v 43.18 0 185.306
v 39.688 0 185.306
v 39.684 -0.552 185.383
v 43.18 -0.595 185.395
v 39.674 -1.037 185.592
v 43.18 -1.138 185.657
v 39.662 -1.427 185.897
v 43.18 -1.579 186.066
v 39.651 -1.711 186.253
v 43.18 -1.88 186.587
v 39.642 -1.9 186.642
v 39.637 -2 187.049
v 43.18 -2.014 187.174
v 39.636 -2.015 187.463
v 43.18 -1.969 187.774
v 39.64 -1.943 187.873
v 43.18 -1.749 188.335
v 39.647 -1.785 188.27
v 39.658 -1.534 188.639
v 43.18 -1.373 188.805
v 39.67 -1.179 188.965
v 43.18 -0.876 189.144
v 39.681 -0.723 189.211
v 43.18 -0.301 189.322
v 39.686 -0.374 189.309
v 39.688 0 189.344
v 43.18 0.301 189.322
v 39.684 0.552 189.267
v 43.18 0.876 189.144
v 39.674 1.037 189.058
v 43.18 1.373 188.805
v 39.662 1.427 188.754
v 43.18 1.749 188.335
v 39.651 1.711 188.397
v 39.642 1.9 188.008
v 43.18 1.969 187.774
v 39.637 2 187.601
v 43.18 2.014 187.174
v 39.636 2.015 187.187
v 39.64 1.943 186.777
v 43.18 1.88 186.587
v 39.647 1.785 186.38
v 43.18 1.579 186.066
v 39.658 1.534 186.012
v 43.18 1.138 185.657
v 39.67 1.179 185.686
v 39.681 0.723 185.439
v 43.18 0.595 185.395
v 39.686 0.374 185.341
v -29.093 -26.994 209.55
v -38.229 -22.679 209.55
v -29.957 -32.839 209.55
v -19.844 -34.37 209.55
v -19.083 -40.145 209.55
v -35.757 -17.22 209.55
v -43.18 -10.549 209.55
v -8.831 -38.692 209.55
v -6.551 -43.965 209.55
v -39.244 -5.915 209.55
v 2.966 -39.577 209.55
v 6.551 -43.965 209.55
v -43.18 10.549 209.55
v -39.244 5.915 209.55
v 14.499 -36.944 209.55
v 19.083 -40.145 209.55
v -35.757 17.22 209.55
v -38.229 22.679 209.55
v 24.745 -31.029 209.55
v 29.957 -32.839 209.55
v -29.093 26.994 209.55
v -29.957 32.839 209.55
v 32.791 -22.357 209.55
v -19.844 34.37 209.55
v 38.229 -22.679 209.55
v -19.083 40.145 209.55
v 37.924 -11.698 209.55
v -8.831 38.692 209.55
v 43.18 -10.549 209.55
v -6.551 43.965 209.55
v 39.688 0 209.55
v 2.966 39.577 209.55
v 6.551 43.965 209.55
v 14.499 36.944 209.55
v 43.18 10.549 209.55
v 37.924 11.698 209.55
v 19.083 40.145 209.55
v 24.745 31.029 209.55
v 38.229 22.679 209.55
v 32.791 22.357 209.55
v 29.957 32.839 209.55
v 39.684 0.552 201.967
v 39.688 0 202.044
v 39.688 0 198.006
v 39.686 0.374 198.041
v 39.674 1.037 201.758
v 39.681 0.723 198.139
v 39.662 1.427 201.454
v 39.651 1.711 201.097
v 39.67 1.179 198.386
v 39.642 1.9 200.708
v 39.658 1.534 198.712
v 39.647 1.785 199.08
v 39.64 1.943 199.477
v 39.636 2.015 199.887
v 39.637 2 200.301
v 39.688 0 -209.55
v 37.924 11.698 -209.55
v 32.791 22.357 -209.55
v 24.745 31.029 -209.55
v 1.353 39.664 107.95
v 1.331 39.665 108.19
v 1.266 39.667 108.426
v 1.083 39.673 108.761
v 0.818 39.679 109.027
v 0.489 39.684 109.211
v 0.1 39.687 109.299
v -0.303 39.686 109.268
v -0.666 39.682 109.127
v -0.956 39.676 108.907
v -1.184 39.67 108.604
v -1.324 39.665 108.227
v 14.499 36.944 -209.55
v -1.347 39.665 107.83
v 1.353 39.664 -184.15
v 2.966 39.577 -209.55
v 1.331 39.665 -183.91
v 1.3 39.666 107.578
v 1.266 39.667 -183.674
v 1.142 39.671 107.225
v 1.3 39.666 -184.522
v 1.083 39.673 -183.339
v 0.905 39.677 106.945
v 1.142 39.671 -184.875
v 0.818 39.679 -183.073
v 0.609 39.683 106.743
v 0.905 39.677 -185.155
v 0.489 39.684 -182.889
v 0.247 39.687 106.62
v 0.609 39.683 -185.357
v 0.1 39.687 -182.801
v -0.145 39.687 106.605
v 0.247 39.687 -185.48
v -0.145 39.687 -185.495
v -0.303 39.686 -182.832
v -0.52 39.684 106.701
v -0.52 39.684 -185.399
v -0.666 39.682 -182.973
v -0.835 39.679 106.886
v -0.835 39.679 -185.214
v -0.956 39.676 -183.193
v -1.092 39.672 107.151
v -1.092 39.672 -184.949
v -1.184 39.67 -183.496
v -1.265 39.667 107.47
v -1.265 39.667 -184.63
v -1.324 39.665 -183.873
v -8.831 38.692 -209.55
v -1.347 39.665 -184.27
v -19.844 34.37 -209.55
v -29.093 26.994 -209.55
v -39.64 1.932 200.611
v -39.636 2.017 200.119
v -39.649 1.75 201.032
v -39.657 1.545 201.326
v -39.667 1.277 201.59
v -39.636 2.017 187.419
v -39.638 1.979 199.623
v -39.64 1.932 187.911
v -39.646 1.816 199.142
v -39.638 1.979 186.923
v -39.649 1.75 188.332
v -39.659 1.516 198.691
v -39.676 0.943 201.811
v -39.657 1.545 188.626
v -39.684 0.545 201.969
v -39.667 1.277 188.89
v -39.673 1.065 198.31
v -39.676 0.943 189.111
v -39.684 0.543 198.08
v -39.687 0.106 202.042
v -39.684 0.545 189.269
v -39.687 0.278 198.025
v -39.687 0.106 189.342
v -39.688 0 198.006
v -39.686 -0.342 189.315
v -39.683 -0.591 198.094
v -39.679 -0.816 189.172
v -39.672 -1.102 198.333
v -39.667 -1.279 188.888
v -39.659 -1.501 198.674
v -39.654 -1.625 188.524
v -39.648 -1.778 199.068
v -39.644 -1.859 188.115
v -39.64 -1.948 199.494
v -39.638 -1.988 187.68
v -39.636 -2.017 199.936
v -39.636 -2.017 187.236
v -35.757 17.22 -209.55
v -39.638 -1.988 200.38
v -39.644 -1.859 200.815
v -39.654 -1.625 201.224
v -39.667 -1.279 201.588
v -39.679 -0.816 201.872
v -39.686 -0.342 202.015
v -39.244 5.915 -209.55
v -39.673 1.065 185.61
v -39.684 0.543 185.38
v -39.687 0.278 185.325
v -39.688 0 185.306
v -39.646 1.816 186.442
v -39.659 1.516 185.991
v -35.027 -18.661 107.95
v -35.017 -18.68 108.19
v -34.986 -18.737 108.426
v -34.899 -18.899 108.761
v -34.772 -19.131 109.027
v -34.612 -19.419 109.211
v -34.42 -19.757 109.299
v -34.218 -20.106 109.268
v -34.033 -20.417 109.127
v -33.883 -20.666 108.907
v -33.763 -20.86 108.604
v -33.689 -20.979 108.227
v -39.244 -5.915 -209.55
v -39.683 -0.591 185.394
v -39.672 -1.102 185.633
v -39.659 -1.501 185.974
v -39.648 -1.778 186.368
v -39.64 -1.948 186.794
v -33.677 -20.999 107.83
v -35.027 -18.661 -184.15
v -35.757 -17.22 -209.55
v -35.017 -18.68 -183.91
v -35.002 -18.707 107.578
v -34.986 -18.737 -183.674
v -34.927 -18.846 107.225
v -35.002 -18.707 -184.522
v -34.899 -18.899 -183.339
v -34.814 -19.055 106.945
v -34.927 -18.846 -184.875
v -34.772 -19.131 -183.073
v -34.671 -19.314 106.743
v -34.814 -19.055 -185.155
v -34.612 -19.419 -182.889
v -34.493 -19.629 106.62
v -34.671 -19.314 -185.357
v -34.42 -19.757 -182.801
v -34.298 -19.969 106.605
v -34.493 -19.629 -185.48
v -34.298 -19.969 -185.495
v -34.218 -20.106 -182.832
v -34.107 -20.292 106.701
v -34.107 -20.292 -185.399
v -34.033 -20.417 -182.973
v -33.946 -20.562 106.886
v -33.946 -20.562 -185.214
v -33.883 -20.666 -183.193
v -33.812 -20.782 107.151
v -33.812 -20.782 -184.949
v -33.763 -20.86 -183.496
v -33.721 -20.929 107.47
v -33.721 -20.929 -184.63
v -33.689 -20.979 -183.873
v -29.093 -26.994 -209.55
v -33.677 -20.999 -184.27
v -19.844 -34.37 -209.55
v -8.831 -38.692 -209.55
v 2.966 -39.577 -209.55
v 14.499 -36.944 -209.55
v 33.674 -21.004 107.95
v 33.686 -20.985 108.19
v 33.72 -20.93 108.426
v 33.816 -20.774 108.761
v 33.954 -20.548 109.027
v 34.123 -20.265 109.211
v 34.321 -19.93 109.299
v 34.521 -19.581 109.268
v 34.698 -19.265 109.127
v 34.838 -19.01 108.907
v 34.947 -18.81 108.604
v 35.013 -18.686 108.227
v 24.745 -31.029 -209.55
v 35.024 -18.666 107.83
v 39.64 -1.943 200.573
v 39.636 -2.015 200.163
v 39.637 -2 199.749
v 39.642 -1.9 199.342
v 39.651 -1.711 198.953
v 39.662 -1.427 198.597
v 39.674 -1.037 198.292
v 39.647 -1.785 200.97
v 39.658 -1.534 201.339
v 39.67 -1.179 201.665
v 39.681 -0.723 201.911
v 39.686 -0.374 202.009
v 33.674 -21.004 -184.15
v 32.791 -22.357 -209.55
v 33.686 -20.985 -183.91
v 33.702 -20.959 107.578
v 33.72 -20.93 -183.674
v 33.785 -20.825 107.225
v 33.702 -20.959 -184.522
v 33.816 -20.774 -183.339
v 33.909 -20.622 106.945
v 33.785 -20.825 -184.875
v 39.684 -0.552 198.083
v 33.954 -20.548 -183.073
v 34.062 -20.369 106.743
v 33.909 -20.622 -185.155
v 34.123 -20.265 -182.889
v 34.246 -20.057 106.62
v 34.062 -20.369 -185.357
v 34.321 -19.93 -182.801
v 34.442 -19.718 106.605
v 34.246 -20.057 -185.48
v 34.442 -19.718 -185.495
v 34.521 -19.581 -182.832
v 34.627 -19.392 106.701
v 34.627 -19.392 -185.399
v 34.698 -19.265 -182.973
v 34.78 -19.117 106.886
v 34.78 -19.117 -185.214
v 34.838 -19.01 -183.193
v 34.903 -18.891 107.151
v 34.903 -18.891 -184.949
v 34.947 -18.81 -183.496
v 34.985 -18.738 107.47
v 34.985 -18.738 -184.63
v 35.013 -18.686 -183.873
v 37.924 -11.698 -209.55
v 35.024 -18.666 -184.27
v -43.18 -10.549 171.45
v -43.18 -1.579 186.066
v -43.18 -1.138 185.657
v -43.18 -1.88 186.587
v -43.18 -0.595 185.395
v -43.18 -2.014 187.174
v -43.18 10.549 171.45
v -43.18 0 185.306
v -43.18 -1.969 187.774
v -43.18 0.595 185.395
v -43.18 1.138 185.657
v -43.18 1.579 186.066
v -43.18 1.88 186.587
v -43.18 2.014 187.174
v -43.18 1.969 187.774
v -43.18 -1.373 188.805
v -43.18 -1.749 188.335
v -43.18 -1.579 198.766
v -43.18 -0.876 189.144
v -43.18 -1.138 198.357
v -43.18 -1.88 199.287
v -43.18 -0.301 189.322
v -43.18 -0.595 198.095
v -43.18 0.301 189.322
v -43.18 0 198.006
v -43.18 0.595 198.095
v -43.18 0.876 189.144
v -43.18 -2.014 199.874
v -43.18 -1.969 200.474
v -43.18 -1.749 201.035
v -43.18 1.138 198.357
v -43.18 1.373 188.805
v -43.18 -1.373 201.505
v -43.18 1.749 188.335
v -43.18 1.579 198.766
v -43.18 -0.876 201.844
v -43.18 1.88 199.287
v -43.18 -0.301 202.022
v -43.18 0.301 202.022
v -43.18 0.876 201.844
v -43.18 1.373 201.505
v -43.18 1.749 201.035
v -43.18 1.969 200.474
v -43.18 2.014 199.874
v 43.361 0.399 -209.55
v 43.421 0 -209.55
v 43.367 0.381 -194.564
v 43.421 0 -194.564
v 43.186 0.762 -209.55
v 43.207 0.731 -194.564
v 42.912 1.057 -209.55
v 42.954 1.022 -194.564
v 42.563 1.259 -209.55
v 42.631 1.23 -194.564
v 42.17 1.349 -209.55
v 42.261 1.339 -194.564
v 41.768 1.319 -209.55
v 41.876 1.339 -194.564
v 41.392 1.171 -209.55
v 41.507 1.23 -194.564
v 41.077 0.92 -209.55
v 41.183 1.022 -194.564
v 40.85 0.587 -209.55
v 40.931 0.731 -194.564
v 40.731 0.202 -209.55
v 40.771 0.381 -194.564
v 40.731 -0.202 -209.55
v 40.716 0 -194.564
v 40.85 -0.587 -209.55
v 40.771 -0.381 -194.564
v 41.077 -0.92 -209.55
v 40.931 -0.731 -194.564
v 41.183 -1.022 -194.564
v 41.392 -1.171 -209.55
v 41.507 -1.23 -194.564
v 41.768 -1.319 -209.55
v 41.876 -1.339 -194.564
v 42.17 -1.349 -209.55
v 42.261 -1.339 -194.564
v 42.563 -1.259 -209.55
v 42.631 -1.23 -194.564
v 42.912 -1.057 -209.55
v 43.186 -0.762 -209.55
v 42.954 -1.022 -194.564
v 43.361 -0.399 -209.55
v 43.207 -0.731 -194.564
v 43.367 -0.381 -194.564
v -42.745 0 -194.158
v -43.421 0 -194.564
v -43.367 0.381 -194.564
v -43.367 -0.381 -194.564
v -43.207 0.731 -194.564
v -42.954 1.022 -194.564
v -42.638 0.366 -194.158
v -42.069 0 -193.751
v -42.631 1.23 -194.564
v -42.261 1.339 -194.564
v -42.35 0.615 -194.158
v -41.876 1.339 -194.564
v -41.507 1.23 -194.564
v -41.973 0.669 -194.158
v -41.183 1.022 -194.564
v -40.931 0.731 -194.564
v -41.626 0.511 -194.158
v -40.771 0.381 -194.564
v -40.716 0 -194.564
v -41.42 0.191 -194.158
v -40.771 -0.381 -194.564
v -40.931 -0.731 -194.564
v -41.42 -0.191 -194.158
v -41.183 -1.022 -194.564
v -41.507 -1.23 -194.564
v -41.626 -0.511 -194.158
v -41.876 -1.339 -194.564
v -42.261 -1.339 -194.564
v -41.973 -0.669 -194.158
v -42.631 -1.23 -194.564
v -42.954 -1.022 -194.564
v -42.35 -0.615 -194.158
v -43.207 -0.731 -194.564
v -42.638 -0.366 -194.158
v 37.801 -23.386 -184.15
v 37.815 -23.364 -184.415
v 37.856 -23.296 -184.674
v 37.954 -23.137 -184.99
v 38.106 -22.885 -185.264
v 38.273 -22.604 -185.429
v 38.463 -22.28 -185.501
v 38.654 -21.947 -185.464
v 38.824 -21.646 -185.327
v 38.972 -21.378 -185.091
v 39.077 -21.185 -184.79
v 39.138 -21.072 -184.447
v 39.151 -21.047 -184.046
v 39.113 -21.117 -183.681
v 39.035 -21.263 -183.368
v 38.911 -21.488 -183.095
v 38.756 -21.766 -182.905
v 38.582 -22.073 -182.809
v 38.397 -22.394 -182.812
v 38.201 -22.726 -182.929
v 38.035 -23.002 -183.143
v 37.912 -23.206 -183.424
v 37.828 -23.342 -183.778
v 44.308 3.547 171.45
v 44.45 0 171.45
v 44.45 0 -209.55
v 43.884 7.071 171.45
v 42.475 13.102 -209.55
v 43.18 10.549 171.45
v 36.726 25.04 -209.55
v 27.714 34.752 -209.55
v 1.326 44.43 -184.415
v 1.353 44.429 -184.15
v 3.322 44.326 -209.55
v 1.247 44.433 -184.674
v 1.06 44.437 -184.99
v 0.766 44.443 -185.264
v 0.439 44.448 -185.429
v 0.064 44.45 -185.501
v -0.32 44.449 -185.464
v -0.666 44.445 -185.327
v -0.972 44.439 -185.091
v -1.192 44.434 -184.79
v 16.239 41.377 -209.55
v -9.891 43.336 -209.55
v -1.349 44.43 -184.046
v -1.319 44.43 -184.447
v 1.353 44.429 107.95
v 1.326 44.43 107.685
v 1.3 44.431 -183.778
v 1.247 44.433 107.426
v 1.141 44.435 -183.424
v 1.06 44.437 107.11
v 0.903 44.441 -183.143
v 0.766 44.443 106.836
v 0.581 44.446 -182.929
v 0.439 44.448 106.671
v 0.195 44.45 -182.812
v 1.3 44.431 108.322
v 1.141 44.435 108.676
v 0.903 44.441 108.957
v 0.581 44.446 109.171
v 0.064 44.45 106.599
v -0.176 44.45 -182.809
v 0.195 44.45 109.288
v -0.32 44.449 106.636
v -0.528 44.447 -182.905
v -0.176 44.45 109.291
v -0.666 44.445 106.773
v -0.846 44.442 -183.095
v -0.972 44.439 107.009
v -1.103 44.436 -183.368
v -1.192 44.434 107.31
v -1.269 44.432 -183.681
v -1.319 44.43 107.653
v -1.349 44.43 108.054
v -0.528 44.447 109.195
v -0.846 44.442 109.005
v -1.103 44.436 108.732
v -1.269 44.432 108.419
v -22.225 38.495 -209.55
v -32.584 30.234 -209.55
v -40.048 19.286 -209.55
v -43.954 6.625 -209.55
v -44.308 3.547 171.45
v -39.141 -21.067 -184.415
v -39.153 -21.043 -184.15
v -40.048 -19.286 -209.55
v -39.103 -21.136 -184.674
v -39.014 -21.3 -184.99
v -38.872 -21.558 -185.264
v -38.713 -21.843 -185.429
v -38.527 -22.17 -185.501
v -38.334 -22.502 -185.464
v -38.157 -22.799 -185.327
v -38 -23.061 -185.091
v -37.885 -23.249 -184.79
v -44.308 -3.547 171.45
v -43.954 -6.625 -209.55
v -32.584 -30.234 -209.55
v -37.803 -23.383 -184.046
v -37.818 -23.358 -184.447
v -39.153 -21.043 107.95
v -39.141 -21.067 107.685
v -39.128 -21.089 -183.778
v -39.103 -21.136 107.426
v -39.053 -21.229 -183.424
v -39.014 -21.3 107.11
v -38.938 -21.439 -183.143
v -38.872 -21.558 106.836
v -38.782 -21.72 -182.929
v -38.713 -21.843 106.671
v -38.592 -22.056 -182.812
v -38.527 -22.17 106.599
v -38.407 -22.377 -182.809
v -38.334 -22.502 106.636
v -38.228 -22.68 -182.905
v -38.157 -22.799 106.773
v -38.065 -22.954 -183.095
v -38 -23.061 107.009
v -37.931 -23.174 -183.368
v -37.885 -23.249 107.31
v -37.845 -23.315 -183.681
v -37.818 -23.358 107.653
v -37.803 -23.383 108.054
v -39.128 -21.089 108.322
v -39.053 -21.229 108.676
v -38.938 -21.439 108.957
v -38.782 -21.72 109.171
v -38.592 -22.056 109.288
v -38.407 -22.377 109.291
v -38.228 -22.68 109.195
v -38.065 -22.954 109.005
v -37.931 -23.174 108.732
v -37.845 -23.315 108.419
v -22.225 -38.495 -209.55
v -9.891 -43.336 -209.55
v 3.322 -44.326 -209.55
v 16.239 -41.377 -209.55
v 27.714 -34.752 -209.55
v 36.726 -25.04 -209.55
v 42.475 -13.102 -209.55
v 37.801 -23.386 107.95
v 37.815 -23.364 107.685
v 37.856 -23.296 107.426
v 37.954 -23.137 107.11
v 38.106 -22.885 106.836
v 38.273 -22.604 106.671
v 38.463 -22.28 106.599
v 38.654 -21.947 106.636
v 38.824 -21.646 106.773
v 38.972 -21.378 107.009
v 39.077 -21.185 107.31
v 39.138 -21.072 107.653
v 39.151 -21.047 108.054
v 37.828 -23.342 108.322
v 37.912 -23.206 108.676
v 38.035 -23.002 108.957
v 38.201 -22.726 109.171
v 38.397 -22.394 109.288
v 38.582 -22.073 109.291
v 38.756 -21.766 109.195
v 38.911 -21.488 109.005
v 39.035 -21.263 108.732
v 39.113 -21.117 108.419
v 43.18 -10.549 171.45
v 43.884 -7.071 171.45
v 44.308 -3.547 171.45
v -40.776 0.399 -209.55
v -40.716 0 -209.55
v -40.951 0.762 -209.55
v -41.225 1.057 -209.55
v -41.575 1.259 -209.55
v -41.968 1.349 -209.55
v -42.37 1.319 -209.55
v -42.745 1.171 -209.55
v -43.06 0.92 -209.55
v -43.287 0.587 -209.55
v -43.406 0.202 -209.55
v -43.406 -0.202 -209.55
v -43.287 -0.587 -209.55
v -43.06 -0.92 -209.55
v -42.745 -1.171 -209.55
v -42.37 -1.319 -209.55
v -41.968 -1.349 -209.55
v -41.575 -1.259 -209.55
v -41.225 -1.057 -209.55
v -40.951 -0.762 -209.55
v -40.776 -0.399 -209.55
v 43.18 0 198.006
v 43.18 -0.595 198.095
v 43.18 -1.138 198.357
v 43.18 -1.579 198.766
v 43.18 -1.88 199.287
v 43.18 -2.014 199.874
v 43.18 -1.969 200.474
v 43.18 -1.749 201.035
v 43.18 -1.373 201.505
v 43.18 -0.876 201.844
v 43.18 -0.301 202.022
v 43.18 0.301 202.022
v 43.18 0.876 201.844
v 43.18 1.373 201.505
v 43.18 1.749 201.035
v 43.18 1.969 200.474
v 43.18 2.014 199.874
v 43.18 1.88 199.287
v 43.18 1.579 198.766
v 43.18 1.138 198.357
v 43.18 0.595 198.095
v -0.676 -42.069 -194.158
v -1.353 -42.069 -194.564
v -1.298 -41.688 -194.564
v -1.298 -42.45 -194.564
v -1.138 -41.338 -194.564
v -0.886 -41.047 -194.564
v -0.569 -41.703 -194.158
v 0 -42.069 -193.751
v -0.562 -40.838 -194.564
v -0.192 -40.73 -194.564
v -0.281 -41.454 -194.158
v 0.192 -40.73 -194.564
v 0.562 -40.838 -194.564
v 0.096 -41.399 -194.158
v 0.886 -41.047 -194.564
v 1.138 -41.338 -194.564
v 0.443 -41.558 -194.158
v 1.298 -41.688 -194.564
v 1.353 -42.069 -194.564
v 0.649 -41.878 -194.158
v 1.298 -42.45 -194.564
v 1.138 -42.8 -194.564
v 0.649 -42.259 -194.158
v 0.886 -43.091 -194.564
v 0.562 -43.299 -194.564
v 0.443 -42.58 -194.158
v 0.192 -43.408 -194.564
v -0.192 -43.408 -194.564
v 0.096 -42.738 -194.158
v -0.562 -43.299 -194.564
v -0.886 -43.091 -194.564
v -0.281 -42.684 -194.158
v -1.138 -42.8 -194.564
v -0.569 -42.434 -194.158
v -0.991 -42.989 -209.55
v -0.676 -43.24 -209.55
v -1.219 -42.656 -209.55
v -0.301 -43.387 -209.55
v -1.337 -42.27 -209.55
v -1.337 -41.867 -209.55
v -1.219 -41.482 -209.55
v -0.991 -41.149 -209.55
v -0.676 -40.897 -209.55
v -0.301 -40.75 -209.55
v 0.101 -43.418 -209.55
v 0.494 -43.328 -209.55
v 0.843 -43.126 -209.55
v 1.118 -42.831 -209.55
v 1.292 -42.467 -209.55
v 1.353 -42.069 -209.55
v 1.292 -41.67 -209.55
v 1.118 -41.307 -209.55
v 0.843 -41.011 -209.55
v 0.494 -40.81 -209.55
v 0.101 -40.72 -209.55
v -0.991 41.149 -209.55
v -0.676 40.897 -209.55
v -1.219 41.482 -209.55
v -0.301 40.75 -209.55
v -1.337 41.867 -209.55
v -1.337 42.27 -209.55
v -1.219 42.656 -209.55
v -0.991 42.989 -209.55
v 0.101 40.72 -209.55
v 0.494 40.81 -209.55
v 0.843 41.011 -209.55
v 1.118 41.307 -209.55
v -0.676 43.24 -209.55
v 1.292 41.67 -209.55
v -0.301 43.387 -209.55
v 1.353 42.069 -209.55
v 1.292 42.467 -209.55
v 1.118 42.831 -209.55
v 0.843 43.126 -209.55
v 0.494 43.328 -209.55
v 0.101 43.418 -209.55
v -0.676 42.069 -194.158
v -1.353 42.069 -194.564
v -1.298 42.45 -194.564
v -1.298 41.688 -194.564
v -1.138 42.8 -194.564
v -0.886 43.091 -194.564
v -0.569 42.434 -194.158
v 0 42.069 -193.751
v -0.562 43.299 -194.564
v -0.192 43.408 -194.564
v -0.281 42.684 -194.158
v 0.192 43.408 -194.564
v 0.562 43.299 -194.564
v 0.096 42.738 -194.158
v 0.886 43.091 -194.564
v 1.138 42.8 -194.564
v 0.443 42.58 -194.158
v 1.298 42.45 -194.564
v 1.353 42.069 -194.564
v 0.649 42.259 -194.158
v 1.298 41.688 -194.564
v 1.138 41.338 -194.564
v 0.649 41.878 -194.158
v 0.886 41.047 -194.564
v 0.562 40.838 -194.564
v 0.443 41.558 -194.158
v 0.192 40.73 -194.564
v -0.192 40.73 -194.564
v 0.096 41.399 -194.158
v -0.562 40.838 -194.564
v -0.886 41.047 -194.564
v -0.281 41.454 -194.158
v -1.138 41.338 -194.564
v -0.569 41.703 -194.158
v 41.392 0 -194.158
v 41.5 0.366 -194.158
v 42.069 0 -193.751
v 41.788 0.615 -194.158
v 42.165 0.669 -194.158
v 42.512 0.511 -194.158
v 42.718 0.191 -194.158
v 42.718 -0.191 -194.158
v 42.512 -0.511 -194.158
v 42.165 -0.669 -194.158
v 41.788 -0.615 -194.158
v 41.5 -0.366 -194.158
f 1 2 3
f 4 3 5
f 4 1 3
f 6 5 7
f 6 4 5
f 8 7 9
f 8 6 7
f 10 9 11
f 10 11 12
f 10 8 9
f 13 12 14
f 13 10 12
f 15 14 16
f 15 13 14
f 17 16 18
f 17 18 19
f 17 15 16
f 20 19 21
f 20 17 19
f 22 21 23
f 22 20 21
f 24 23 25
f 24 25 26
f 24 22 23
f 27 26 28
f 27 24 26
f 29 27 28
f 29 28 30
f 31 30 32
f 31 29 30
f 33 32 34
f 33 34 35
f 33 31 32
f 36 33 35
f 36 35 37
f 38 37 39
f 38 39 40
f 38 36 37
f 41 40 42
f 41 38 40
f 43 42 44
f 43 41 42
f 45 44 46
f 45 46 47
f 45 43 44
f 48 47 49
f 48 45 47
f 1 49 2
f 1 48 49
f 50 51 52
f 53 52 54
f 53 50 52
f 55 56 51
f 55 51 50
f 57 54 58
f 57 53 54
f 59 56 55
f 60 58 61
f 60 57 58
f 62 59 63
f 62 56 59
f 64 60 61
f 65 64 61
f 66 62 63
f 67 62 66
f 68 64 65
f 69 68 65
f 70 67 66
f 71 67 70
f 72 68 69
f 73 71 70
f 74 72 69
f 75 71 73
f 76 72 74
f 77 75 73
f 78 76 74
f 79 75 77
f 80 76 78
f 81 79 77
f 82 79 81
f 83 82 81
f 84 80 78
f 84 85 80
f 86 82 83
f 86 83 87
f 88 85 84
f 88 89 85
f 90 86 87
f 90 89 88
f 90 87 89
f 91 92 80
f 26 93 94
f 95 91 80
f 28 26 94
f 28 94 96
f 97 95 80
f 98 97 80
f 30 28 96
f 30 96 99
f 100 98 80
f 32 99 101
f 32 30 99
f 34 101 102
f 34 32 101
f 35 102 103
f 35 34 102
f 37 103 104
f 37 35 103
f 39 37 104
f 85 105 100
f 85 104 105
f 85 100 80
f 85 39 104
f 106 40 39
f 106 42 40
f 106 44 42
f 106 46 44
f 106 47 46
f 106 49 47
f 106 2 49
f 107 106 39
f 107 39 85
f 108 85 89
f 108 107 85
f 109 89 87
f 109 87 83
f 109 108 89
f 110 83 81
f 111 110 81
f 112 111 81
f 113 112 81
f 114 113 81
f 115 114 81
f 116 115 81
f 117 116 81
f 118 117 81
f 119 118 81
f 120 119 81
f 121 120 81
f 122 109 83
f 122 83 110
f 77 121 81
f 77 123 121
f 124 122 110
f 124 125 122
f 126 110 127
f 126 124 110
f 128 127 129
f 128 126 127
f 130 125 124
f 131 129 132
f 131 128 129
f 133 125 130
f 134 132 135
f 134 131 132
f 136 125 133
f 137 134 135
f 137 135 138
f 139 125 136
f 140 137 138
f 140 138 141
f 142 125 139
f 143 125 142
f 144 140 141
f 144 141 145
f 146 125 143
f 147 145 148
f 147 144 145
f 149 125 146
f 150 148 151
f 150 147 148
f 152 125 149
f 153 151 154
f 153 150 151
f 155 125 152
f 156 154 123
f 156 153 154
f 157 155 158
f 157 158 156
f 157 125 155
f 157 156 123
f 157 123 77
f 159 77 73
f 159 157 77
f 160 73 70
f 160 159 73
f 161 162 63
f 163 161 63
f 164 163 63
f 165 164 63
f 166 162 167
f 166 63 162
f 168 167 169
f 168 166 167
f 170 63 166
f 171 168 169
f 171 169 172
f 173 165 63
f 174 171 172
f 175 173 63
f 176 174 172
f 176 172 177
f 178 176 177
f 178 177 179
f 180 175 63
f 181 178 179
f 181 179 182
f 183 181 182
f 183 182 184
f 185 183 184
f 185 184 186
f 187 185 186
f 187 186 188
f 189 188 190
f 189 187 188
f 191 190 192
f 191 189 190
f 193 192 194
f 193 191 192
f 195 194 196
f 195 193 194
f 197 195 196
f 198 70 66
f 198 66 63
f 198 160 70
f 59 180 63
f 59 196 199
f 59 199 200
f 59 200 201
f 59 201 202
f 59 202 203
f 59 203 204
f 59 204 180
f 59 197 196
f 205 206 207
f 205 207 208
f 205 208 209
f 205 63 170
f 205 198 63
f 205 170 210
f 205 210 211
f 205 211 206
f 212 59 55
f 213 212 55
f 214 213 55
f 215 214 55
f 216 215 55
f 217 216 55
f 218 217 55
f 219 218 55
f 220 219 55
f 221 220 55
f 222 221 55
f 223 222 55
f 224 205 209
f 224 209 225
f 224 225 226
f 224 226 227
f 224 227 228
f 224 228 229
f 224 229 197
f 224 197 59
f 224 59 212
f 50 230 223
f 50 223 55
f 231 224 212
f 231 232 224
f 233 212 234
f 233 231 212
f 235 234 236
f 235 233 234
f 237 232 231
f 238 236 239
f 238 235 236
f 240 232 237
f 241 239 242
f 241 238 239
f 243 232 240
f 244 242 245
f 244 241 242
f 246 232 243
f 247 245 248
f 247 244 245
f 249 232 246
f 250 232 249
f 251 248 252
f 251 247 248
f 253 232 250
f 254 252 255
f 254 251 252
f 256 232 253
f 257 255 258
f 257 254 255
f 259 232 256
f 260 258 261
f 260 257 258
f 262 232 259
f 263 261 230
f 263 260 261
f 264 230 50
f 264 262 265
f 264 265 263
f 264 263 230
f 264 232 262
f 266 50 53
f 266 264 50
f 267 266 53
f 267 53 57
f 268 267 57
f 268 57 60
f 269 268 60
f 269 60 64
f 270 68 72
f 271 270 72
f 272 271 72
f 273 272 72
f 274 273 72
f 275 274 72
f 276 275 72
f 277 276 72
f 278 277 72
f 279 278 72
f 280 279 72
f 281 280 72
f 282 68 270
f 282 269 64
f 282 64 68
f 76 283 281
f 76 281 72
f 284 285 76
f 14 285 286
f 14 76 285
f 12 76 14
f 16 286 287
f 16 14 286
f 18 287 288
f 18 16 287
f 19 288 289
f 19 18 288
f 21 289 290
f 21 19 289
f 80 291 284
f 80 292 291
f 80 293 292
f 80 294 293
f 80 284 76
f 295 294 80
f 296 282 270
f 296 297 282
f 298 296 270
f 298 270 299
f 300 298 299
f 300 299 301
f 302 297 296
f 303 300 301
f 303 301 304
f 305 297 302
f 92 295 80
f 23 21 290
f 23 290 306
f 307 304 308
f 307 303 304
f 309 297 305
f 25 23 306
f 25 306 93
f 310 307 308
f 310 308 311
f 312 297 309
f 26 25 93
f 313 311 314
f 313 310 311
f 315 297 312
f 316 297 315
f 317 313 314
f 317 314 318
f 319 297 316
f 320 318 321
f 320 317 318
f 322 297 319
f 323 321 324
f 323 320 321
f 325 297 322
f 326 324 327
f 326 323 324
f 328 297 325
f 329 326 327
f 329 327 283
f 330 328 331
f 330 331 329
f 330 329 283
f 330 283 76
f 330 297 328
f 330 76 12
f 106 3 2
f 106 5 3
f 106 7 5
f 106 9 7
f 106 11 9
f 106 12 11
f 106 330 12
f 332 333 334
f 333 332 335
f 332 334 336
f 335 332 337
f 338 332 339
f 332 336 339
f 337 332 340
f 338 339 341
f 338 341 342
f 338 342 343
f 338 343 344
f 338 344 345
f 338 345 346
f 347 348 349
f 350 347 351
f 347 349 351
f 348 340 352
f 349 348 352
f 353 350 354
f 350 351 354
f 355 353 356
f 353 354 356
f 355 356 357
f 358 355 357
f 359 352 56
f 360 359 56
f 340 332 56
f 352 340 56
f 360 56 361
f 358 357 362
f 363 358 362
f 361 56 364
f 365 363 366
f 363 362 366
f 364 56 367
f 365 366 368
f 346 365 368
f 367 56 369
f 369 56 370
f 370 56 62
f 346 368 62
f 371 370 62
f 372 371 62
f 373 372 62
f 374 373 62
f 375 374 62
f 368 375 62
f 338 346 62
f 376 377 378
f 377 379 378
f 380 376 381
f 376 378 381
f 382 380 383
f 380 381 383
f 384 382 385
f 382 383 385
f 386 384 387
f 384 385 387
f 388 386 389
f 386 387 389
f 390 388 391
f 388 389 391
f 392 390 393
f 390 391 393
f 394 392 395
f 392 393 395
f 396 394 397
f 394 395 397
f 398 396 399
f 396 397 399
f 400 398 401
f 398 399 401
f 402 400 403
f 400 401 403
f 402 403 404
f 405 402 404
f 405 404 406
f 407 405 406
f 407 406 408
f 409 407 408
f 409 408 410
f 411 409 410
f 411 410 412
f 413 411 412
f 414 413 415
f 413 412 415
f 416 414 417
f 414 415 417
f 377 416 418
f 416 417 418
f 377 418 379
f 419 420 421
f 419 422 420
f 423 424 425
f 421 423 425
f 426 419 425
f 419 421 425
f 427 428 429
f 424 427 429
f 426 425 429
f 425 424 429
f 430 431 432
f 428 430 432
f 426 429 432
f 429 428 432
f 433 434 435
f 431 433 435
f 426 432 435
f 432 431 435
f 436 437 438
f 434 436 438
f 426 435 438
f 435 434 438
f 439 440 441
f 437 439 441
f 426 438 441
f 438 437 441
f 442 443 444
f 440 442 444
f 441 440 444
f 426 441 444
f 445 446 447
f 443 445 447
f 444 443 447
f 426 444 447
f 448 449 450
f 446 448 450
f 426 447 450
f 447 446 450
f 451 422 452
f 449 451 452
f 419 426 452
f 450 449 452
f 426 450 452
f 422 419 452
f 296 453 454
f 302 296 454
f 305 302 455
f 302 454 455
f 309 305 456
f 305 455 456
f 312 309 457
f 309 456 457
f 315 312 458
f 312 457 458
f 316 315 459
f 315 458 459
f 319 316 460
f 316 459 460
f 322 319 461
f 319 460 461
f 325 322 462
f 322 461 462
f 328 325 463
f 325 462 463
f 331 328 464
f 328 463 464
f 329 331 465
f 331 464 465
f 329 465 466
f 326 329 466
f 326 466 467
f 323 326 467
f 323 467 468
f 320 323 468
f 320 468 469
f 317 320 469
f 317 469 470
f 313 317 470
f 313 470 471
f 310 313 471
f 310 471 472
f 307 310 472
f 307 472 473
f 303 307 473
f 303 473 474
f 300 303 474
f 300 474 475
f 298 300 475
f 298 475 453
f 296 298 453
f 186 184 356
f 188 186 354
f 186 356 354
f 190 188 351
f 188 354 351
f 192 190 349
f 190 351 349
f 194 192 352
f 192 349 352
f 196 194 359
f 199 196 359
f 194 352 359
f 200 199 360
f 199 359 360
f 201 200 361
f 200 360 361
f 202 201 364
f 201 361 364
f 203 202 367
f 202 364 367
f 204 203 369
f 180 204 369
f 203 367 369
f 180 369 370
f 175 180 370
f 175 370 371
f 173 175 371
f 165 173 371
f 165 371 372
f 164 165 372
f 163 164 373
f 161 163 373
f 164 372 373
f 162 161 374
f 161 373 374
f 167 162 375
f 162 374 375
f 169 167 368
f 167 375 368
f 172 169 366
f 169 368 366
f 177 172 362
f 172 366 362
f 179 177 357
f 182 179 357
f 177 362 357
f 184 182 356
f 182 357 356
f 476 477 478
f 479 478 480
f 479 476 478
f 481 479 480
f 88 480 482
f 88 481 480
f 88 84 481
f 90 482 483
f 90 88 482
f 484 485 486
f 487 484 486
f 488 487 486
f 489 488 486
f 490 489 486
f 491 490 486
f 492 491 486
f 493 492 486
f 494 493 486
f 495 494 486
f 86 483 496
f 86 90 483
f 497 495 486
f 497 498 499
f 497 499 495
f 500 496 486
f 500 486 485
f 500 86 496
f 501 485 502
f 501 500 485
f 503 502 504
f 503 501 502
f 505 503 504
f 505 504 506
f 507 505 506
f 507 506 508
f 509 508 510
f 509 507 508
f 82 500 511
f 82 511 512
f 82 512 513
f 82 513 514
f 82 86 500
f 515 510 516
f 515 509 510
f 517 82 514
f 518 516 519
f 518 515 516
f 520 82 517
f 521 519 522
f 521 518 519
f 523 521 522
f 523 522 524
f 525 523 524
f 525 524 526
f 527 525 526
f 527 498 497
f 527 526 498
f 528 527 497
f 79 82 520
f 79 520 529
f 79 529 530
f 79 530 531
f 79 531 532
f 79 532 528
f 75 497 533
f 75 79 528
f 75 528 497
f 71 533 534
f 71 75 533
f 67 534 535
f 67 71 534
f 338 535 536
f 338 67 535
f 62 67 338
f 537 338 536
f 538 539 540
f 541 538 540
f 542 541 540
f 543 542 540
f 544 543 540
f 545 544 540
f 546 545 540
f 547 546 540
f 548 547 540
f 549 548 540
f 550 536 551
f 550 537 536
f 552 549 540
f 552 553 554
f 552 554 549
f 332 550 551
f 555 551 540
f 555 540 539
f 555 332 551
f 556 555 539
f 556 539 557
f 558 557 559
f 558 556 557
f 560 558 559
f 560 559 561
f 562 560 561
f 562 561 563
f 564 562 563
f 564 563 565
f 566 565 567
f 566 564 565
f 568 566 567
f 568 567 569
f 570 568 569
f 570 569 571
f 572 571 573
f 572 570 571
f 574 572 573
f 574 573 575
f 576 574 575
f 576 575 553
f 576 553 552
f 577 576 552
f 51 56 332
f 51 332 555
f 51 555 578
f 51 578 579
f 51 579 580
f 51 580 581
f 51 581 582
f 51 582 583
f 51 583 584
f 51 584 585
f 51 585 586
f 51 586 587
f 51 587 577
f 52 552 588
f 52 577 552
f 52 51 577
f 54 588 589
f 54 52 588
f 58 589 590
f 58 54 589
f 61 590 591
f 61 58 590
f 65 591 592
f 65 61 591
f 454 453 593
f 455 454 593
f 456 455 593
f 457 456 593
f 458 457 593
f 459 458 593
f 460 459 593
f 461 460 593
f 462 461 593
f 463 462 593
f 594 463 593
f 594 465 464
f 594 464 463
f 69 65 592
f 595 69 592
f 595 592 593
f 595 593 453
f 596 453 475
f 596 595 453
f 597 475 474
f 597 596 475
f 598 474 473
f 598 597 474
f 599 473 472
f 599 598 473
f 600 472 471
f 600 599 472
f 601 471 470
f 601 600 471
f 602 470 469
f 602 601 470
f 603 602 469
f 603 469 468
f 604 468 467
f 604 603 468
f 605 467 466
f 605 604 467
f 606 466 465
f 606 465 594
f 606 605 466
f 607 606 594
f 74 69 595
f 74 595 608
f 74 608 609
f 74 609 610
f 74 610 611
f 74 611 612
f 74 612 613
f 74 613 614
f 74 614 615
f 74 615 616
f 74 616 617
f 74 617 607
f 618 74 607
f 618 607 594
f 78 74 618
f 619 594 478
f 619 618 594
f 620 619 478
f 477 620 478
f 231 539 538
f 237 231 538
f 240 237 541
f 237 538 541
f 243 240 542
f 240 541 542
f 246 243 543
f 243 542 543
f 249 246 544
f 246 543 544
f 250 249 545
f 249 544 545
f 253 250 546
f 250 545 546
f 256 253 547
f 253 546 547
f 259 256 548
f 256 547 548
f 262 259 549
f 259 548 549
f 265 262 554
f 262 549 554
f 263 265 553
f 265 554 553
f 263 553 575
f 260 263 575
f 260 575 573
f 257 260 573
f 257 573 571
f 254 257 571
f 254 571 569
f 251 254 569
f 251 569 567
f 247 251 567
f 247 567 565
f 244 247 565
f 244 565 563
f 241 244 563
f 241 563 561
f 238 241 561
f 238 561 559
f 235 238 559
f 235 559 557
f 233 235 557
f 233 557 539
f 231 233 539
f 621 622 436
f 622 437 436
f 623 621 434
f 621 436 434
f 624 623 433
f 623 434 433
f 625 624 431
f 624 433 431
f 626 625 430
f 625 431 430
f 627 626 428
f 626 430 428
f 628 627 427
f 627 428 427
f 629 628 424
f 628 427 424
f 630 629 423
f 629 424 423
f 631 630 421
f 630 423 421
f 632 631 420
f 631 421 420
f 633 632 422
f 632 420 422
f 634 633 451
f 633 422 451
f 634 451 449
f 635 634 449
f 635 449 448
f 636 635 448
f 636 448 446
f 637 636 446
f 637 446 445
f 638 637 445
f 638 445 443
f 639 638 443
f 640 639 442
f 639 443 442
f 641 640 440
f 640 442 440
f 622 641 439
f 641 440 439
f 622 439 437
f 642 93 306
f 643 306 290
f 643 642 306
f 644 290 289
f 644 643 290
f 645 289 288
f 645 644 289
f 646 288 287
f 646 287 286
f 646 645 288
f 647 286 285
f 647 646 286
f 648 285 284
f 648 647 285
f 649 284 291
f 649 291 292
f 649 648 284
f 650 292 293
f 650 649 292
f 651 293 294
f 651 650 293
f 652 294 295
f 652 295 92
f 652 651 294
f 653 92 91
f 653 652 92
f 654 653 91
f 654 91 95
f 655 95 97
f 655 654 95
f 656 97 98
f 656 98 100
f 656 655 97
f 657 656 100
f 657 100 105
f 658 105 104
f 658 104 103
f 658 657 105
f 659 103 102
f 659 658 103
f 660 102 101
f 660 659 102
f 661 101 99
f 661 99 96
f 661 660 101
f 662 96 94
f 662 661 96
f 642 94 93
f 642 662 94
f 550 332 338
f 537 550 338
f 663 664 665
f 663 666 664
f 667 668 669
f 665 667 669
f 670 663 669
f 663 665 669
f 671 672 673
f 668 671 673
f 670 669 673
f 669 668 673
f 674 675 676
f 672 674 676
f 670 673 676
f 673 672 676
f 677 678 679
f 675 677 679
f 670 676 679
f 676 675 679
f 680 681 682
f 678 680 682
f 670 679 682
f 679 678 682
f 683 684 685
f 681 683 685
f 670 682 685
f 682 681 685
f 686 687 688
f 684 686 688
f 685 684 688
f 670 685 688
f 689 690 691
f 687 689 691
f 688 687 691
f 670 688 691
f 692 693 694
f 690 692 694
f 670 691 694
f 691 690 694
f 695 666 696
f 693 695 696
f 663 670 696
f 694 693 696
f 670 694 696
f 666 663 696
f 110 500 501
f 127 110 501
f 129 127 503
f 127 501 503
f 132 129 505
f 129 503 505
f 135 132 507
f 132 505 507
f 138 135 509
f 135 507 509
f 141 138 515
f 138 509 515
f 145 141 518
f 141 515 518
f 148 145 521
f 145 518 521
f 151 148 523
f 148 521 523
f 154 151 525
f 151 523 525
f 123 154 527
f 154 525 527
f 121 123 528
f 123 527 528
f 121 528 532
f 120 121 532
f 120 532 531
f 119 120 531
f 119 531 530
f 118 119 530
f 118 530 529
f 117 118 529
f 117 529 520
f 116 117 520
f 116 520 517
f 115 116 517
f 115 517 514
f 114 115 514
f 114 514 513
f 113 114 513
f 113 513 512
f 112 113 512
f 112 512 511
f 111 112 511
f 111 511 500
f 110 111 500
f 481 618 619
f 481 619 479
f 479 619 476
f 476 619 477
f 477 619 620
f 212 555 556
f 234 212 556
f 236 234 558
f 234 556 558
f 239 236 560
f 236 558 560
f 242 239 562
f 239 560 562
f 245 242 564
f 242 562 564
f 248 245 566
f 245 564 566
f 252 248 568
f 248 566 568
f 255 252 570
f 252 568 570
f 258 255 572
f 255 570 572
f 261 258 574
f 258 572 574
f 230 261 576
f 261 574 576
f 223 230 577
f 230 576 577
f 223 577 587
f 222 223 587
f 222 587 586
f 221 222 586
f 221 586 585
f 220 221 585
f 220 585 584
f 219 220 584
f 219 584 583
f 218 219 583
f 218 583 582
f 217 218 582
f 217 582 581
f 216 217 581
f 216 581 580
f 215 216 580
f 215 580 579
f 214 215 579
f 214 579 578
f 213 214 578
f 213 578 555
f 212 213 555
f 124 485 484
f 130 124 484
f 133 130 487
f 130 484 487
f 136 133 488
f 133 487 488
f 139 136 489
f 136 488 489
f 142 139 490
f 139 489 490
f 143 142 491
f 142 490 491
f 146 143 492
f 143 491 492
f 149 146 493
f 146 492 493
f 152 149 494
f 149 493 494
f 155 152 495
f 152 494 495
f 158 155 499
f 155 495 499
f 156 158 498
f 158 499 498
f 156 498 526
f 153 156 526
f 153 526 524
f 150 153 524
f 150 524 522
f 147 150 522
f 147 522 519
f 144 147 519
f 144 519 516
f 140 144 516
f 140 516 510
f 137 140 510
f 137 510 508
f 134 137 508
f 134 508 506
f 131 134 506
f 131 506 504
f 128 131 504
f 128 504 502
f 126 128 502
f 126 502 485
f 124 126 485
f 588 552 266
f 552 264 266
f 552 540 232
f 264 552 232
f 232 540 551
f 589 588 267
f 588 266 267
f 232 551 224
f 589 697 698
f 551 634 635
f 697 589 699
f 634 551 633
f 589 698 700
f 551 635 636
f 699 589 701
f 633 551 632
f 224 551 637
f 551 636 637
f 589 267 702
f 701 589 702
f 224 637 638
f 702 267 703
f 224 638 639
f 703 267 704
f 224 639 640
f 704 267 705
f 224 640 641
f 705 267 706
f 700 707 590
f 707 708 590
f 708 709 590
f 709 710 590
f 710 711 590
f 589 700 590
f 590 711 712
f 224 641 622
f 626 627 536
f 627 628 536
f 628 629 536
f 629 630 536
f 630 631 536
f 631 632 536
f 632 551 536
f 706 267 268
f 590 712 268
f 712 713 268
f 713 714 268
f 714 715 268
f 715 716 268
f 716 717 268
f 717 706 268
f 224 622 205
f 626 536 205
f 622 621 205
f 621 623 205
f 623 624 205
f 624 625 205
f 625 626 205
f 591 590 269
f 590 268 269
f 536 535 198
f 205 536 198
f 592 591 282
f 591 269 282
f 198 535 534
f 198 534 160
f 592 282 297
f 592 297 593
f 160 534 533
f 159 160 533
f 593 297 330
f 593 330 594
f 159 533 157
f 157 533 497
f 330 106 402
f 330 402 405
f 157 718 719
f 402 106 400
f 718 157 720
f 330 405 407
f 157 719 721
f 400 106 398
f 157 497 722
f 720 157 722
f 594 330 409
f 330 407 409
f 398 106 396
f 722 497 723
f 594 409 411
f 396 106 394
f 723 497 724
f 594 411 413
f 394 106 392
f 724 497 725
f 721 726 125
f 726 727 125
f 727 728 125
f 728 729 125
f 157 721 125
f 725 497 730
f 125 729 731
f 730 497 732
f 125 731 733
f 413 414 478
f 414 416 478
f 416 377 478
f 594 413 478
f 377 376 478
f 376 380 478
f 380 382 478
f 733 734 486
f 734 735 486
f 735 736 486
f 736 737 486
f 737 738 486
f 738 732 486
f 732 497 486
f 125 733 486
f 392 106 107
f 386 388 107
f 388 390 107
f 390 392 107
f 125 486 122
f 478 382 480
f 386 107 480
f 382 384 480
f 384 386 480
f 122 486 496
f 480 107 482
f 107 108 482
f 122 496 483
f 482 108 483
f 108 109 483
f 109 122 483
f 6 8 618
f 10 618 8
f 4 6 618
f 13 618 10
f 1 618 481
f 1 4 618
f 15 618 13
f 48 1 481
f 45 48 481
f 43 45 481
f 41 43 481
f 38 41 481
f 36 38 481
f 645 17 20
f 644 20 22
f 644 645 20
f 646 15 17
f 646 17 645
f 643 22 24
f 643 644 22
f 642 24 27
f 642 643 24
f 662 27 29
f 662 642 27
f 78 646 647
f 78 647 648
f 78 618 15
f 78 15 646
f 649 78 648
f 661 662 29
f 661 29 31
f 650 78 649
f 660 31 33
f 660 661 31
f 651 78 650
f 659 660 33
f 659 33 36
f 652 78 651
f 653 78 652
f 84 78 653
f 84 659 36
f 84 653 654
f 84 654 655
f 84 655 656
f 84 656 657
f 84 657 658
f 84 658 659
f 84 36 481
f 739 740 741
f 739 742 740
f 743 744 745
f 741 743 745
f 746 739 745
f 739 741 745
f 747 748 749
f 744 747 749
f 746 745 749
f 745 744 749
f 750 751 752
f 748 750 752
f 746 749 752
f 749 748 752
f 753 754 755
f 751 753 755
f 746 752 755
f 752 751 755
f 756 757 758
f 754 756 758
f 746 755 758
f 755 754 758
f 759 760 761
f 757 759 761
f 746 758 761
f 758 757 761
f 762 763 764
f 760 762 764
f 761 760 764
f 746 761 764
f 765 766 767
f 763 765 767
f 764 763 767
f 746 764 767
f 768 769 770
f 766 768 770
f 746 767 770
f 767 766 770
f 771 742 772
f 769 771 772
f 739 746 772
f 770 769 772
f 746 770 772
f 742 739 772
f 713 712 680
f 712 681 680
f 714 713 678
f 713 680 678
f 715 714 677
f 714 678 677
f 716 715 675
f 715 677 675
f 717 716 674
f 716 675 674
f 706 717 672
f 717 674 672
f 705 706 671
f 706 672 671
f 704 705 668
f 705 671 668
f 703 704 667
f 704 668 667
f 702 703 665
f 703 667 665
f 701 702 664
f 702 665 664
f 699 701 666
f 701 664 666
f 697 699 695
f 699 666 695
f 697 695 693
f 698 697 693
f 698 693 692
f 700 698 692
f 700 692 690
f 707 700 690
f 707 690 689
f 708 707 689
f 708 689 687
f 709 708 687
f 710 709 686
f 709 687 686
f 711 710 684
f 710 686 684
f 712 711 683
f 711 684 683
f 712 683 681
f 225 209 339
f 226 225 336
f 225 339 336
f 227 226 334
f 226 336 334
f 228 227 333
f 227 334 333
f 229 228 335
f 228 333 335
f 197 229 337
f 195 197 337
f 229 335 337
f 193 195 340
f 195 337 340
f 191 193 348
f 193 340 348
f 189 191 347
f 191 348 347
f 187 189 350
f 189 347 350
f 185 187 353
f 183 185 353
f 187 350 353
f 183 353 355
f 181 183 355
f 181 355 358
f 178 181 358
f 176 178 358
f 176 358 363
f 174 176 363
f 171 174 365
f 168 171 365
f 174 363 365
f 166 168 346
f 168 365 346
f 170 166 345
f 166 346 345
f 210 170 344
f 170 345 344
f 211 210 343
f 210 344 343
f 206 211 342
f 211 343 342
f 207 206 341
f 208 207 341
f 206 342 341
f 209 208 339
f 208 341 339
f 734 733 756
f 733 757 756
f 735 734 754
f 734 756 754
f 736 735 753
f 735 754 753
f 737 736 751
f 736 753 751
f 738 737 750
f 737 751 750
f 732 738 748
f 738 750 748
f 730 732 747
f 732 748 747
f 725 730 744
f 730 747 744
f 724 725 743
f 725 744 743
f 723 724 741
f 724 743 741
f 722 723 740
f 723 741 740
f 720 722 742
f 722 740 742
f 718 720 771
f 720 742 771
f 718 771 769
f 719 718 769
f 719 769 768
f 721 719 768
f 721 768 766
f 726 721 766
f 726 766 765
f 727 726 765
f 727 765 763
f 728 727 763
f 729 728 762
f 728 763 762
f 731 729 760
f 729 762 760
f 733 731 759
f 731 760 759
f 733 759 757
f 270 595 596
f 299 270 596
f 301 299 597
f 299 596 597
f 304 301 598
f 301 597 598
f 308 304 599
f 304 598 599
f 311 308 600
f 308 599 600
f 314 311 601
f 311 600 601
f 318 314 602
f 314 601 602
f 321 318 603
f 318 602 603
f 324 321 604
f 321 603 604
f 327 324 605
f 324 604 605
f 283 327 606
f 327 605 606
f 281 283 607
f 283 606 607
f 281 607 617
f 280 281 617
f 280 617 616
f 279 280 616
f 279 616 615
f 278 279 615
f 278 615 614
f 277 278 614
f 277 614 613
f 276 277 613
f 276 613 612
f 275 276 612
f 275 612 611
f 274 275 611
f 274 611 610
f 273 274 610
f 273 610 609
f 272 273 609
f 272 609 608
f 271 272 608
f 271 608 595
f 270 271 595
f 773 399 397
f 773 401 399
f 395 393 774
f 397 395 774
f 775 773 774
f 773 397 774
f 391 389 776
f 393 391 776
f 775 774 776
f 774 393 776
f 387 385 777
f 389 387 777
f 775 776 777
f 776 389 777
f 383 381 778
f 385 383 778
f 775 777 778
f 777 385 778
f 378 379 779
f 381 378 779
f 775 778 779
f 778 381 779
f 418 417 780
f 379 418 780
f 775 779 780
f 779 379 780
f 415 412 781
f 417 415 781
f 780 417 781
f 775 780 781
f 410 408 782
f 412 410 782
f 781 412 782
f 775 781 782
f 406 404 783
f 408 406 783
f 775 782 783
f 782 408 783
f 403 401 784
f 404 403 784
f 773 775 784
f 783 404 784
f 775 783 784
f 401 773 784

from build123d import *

# Parameters (mm, degrees)
SKETCH1_R                       = 44.45
SKETCH1_R_2                     = 39.6875
BOSS_EXTRUDE1_DEPTH             = 209.55
SKETCH2_W                       = 7.89975339
SKETCH2_H                       = 28.462346772
CUT_EXTRUDE1_DEPTH              = 38.1
F_10_32_TAPPED_HOLE1_AT_2_COUNT = 2
F_10_32_TAPPED_HOLE1_AT_2_PITCH = 12.7
F_6_32_TAPPED_HOLE1_D           = 2.7051
F_6_32_TAPPED_HOLE1_DEPTH       = 14.986
F_6_32_TAPPED_HOLE1_TIP         = 0.81269403
F_6_32_TAPPED_HOLE2_REACH       = 408.053
F_6_32_TAPPED_HOLE2_BORE_R      = 1.35255
CIRPATTERN1_COUNT               = 3


with BuildPart() as part:
    # Sketch1 → Boss-Extrude1 (new, symmetric)
    with BuildSketch(Plane.XY):
        Circle(SKETCH1_R)
        Circle(SKETCH1_R_2, mode=Mode.SUBTRACT)
    extrude(amount=BOSS_EXTRUDE1_DEPTH, both=True)

    # Sketch2 → Cut-Extrude1 (cut)
    with BuildSketch(Plane.XY.offset(209.55)):
        with Locations((47.129876695, -0.406604954)):
            Rectangle(SKETCH2_W, SKETCH2_H)
    cut_extrude1 = extrude(amount=-CUT_EXTRUDE1_DEPTH, mode=Mode.SUBTRACT)

    # Sketch3 → #10-32 Tapped Hole1 (revolve, cut)
    with BuildSketch(Plane(origin=(43.18, 0, 200.025), x_dir=(0, 0, -1), z_dir=(0, 1, 0))):
        Polygon((0, 0), (0, 14.929317848), (2.0193, 13.716), (2.0193, 0), align=None)
    f_10_32_tapped_hole1 = revolve(axis=Axis((49.53, 0, 200.025), (-1, 0, 0)), mode=Mode.SUBTRACT)

    # #10-32 Tapped Hole1 at 2: #10-32 Tapped Hole1 ×2
    with Locations(*[(0, 0, -i * F_10_32_TAPPED_HOLE1_AT_2_PITCH) for i in range(1, F_10_32_TAPPED_HOLE1_AT_2_COUNT)]):
        add(f_10_32_tapped_hole1, mode=Mode.SUBTRACT)

    # #6-32 Tapped Hole1
    with Locations(Plane(origin=(0, 0, -209.55), x_dir=(-1, 0, 0), z_dir=(0, 0, -1))):
        with Locations((0, 42.06875), (-42.06875, 0), (42.06875, 0), (0, -42.06875)):
            Hole(F_6_32_TAPPED_HOLE1_D / 2, depth=F_6_32_TAPPED_HOLE1_DEPTH)
            with Locations((0, 0, -(F_6_32_TAPPED_HOLE1_DEPTH + F_6_32_TAPPED_HOLE1_TIP / 2))):  # 118° drill point
                Cone(0, F_6_32_TAPPED_HOLE1_D / 2, F_6_32_TAPPED_HOLE1_TIP, mode=Mode.SUBTRACT)

    # Mirror1: Cut-Extrude1, #10-32 Tapped Hole1 across plane
    add(cut_extrude1.mirror(Plane(origin=(0, 0, 0), x_dir=(0, 0, 1), z_dir=(1, 0, 0))), mode=Mode.SUBTRACT)
    add(f_10_32_tapped_hole1.mirror(Plane(origin=(0, 0, 0), x_dir=(0, 0, 1), z_dir=(1, 0, 0))), mode=Mode.SUBTRACT)

    # Mirror1 copy 1 sketch → Mirror1 copy 1 (revolve, cut)
    with BuildSketch(Plane(origin=(-43.18, 0, 187.325), x_dir=(0, 0, -1), z_dir=(0, 1, 0))):
        Polygon((0, 0), (0, -14.929317848), (2.0193, -13.716), (2.0193, 0), align=None)
    revolve(axis=Axis((-49.53, 0, 187.325), (-1, 0, 0)), mode=Mode.SUBTRACT)

    # #6-32 Tapped Hole2 bore (on position points) → #6-32 Tapped Hole2 (cut, up to next)
    with BuildSketch(Plane(origin=(0, 44.45, -184.15), x_dir=(1, 0, 0), z_dir=(0, 1, 0)), mode=Mode.PRIVATE) as f_6_32_tapped_hole2_sk1:
        Circle(F_6_32_TAPPED_HOLE2_BORE_R)
    f_6_32_tapped_hole2_tool1 = extrude(f_6_32_tapped_hole2_sk1.sketch, amount=-F_6_32_TAPPED_HOLE2_REACH, mode=Mode.PRIVATE) & part.part
    # #6-32 Tapped Hole2 bore (on position points) → #6-32 Tapped Hole2 (cut, up to next)
    with BuildSketch(Plane(origin=(0, 44.45, -184.15), x_dir=(1, 0, 0), z_dir=(0, 1, 0)), mode=Mode.PRIVATE) as f_6_32_tapped_hole2_sk2:
        with Locations((0, -292.1)):
            Circle(F_6_32_TAPPED_HOLE2_BORE_R)
    f_6_32_tapped_hole2_tool2 = extrude(f_6_32_tapped_hole2_sk2.sketch, amount=-F_6_32_TAPPED_HOLE2_REACH, mode=Mode.PRIVATE) & part.part
    f_6_32_tapped_hole2_1 = f_6_32_tapped_hole2_tool1.solids().sort_by_distance((0, 44.45, -184.15))[0]
    add(f_6_32_tapped_hole2_1, mode=Mode.SUBTRACT)
    f_6_32_tapped_hole2_2 = f_6_32_tapped_hole2_tool2.solids().sort_by_distance((0, 44.45, 107.95))[0]
    add(f_6_32_tapped_hole2_2, mode=Mode.SUBTRACT)
    f_6_32_tapped_hole2 = f_6_32_tapped_hole2_1 + f_6_32_tapped_hole2_2  # #6-32 Tapped Hole2 as one shape, for the pattern or mirror that repeats it

    # CirPattern1: #6-32 Tapped Hole2 ×3 about axis
    cirpattern1_axis = Axis((0, 0, -209.55), (0, 0, 1))
    for i in range(1, CIRPATTERN1_COUNT):
        add(f_6_32_tapped_hole2.rotate(cirpattern1_axis, i * 360 / CIRPATTERN1_COUNT), mode=Mode.SUBTRACT)


solid = part.part
